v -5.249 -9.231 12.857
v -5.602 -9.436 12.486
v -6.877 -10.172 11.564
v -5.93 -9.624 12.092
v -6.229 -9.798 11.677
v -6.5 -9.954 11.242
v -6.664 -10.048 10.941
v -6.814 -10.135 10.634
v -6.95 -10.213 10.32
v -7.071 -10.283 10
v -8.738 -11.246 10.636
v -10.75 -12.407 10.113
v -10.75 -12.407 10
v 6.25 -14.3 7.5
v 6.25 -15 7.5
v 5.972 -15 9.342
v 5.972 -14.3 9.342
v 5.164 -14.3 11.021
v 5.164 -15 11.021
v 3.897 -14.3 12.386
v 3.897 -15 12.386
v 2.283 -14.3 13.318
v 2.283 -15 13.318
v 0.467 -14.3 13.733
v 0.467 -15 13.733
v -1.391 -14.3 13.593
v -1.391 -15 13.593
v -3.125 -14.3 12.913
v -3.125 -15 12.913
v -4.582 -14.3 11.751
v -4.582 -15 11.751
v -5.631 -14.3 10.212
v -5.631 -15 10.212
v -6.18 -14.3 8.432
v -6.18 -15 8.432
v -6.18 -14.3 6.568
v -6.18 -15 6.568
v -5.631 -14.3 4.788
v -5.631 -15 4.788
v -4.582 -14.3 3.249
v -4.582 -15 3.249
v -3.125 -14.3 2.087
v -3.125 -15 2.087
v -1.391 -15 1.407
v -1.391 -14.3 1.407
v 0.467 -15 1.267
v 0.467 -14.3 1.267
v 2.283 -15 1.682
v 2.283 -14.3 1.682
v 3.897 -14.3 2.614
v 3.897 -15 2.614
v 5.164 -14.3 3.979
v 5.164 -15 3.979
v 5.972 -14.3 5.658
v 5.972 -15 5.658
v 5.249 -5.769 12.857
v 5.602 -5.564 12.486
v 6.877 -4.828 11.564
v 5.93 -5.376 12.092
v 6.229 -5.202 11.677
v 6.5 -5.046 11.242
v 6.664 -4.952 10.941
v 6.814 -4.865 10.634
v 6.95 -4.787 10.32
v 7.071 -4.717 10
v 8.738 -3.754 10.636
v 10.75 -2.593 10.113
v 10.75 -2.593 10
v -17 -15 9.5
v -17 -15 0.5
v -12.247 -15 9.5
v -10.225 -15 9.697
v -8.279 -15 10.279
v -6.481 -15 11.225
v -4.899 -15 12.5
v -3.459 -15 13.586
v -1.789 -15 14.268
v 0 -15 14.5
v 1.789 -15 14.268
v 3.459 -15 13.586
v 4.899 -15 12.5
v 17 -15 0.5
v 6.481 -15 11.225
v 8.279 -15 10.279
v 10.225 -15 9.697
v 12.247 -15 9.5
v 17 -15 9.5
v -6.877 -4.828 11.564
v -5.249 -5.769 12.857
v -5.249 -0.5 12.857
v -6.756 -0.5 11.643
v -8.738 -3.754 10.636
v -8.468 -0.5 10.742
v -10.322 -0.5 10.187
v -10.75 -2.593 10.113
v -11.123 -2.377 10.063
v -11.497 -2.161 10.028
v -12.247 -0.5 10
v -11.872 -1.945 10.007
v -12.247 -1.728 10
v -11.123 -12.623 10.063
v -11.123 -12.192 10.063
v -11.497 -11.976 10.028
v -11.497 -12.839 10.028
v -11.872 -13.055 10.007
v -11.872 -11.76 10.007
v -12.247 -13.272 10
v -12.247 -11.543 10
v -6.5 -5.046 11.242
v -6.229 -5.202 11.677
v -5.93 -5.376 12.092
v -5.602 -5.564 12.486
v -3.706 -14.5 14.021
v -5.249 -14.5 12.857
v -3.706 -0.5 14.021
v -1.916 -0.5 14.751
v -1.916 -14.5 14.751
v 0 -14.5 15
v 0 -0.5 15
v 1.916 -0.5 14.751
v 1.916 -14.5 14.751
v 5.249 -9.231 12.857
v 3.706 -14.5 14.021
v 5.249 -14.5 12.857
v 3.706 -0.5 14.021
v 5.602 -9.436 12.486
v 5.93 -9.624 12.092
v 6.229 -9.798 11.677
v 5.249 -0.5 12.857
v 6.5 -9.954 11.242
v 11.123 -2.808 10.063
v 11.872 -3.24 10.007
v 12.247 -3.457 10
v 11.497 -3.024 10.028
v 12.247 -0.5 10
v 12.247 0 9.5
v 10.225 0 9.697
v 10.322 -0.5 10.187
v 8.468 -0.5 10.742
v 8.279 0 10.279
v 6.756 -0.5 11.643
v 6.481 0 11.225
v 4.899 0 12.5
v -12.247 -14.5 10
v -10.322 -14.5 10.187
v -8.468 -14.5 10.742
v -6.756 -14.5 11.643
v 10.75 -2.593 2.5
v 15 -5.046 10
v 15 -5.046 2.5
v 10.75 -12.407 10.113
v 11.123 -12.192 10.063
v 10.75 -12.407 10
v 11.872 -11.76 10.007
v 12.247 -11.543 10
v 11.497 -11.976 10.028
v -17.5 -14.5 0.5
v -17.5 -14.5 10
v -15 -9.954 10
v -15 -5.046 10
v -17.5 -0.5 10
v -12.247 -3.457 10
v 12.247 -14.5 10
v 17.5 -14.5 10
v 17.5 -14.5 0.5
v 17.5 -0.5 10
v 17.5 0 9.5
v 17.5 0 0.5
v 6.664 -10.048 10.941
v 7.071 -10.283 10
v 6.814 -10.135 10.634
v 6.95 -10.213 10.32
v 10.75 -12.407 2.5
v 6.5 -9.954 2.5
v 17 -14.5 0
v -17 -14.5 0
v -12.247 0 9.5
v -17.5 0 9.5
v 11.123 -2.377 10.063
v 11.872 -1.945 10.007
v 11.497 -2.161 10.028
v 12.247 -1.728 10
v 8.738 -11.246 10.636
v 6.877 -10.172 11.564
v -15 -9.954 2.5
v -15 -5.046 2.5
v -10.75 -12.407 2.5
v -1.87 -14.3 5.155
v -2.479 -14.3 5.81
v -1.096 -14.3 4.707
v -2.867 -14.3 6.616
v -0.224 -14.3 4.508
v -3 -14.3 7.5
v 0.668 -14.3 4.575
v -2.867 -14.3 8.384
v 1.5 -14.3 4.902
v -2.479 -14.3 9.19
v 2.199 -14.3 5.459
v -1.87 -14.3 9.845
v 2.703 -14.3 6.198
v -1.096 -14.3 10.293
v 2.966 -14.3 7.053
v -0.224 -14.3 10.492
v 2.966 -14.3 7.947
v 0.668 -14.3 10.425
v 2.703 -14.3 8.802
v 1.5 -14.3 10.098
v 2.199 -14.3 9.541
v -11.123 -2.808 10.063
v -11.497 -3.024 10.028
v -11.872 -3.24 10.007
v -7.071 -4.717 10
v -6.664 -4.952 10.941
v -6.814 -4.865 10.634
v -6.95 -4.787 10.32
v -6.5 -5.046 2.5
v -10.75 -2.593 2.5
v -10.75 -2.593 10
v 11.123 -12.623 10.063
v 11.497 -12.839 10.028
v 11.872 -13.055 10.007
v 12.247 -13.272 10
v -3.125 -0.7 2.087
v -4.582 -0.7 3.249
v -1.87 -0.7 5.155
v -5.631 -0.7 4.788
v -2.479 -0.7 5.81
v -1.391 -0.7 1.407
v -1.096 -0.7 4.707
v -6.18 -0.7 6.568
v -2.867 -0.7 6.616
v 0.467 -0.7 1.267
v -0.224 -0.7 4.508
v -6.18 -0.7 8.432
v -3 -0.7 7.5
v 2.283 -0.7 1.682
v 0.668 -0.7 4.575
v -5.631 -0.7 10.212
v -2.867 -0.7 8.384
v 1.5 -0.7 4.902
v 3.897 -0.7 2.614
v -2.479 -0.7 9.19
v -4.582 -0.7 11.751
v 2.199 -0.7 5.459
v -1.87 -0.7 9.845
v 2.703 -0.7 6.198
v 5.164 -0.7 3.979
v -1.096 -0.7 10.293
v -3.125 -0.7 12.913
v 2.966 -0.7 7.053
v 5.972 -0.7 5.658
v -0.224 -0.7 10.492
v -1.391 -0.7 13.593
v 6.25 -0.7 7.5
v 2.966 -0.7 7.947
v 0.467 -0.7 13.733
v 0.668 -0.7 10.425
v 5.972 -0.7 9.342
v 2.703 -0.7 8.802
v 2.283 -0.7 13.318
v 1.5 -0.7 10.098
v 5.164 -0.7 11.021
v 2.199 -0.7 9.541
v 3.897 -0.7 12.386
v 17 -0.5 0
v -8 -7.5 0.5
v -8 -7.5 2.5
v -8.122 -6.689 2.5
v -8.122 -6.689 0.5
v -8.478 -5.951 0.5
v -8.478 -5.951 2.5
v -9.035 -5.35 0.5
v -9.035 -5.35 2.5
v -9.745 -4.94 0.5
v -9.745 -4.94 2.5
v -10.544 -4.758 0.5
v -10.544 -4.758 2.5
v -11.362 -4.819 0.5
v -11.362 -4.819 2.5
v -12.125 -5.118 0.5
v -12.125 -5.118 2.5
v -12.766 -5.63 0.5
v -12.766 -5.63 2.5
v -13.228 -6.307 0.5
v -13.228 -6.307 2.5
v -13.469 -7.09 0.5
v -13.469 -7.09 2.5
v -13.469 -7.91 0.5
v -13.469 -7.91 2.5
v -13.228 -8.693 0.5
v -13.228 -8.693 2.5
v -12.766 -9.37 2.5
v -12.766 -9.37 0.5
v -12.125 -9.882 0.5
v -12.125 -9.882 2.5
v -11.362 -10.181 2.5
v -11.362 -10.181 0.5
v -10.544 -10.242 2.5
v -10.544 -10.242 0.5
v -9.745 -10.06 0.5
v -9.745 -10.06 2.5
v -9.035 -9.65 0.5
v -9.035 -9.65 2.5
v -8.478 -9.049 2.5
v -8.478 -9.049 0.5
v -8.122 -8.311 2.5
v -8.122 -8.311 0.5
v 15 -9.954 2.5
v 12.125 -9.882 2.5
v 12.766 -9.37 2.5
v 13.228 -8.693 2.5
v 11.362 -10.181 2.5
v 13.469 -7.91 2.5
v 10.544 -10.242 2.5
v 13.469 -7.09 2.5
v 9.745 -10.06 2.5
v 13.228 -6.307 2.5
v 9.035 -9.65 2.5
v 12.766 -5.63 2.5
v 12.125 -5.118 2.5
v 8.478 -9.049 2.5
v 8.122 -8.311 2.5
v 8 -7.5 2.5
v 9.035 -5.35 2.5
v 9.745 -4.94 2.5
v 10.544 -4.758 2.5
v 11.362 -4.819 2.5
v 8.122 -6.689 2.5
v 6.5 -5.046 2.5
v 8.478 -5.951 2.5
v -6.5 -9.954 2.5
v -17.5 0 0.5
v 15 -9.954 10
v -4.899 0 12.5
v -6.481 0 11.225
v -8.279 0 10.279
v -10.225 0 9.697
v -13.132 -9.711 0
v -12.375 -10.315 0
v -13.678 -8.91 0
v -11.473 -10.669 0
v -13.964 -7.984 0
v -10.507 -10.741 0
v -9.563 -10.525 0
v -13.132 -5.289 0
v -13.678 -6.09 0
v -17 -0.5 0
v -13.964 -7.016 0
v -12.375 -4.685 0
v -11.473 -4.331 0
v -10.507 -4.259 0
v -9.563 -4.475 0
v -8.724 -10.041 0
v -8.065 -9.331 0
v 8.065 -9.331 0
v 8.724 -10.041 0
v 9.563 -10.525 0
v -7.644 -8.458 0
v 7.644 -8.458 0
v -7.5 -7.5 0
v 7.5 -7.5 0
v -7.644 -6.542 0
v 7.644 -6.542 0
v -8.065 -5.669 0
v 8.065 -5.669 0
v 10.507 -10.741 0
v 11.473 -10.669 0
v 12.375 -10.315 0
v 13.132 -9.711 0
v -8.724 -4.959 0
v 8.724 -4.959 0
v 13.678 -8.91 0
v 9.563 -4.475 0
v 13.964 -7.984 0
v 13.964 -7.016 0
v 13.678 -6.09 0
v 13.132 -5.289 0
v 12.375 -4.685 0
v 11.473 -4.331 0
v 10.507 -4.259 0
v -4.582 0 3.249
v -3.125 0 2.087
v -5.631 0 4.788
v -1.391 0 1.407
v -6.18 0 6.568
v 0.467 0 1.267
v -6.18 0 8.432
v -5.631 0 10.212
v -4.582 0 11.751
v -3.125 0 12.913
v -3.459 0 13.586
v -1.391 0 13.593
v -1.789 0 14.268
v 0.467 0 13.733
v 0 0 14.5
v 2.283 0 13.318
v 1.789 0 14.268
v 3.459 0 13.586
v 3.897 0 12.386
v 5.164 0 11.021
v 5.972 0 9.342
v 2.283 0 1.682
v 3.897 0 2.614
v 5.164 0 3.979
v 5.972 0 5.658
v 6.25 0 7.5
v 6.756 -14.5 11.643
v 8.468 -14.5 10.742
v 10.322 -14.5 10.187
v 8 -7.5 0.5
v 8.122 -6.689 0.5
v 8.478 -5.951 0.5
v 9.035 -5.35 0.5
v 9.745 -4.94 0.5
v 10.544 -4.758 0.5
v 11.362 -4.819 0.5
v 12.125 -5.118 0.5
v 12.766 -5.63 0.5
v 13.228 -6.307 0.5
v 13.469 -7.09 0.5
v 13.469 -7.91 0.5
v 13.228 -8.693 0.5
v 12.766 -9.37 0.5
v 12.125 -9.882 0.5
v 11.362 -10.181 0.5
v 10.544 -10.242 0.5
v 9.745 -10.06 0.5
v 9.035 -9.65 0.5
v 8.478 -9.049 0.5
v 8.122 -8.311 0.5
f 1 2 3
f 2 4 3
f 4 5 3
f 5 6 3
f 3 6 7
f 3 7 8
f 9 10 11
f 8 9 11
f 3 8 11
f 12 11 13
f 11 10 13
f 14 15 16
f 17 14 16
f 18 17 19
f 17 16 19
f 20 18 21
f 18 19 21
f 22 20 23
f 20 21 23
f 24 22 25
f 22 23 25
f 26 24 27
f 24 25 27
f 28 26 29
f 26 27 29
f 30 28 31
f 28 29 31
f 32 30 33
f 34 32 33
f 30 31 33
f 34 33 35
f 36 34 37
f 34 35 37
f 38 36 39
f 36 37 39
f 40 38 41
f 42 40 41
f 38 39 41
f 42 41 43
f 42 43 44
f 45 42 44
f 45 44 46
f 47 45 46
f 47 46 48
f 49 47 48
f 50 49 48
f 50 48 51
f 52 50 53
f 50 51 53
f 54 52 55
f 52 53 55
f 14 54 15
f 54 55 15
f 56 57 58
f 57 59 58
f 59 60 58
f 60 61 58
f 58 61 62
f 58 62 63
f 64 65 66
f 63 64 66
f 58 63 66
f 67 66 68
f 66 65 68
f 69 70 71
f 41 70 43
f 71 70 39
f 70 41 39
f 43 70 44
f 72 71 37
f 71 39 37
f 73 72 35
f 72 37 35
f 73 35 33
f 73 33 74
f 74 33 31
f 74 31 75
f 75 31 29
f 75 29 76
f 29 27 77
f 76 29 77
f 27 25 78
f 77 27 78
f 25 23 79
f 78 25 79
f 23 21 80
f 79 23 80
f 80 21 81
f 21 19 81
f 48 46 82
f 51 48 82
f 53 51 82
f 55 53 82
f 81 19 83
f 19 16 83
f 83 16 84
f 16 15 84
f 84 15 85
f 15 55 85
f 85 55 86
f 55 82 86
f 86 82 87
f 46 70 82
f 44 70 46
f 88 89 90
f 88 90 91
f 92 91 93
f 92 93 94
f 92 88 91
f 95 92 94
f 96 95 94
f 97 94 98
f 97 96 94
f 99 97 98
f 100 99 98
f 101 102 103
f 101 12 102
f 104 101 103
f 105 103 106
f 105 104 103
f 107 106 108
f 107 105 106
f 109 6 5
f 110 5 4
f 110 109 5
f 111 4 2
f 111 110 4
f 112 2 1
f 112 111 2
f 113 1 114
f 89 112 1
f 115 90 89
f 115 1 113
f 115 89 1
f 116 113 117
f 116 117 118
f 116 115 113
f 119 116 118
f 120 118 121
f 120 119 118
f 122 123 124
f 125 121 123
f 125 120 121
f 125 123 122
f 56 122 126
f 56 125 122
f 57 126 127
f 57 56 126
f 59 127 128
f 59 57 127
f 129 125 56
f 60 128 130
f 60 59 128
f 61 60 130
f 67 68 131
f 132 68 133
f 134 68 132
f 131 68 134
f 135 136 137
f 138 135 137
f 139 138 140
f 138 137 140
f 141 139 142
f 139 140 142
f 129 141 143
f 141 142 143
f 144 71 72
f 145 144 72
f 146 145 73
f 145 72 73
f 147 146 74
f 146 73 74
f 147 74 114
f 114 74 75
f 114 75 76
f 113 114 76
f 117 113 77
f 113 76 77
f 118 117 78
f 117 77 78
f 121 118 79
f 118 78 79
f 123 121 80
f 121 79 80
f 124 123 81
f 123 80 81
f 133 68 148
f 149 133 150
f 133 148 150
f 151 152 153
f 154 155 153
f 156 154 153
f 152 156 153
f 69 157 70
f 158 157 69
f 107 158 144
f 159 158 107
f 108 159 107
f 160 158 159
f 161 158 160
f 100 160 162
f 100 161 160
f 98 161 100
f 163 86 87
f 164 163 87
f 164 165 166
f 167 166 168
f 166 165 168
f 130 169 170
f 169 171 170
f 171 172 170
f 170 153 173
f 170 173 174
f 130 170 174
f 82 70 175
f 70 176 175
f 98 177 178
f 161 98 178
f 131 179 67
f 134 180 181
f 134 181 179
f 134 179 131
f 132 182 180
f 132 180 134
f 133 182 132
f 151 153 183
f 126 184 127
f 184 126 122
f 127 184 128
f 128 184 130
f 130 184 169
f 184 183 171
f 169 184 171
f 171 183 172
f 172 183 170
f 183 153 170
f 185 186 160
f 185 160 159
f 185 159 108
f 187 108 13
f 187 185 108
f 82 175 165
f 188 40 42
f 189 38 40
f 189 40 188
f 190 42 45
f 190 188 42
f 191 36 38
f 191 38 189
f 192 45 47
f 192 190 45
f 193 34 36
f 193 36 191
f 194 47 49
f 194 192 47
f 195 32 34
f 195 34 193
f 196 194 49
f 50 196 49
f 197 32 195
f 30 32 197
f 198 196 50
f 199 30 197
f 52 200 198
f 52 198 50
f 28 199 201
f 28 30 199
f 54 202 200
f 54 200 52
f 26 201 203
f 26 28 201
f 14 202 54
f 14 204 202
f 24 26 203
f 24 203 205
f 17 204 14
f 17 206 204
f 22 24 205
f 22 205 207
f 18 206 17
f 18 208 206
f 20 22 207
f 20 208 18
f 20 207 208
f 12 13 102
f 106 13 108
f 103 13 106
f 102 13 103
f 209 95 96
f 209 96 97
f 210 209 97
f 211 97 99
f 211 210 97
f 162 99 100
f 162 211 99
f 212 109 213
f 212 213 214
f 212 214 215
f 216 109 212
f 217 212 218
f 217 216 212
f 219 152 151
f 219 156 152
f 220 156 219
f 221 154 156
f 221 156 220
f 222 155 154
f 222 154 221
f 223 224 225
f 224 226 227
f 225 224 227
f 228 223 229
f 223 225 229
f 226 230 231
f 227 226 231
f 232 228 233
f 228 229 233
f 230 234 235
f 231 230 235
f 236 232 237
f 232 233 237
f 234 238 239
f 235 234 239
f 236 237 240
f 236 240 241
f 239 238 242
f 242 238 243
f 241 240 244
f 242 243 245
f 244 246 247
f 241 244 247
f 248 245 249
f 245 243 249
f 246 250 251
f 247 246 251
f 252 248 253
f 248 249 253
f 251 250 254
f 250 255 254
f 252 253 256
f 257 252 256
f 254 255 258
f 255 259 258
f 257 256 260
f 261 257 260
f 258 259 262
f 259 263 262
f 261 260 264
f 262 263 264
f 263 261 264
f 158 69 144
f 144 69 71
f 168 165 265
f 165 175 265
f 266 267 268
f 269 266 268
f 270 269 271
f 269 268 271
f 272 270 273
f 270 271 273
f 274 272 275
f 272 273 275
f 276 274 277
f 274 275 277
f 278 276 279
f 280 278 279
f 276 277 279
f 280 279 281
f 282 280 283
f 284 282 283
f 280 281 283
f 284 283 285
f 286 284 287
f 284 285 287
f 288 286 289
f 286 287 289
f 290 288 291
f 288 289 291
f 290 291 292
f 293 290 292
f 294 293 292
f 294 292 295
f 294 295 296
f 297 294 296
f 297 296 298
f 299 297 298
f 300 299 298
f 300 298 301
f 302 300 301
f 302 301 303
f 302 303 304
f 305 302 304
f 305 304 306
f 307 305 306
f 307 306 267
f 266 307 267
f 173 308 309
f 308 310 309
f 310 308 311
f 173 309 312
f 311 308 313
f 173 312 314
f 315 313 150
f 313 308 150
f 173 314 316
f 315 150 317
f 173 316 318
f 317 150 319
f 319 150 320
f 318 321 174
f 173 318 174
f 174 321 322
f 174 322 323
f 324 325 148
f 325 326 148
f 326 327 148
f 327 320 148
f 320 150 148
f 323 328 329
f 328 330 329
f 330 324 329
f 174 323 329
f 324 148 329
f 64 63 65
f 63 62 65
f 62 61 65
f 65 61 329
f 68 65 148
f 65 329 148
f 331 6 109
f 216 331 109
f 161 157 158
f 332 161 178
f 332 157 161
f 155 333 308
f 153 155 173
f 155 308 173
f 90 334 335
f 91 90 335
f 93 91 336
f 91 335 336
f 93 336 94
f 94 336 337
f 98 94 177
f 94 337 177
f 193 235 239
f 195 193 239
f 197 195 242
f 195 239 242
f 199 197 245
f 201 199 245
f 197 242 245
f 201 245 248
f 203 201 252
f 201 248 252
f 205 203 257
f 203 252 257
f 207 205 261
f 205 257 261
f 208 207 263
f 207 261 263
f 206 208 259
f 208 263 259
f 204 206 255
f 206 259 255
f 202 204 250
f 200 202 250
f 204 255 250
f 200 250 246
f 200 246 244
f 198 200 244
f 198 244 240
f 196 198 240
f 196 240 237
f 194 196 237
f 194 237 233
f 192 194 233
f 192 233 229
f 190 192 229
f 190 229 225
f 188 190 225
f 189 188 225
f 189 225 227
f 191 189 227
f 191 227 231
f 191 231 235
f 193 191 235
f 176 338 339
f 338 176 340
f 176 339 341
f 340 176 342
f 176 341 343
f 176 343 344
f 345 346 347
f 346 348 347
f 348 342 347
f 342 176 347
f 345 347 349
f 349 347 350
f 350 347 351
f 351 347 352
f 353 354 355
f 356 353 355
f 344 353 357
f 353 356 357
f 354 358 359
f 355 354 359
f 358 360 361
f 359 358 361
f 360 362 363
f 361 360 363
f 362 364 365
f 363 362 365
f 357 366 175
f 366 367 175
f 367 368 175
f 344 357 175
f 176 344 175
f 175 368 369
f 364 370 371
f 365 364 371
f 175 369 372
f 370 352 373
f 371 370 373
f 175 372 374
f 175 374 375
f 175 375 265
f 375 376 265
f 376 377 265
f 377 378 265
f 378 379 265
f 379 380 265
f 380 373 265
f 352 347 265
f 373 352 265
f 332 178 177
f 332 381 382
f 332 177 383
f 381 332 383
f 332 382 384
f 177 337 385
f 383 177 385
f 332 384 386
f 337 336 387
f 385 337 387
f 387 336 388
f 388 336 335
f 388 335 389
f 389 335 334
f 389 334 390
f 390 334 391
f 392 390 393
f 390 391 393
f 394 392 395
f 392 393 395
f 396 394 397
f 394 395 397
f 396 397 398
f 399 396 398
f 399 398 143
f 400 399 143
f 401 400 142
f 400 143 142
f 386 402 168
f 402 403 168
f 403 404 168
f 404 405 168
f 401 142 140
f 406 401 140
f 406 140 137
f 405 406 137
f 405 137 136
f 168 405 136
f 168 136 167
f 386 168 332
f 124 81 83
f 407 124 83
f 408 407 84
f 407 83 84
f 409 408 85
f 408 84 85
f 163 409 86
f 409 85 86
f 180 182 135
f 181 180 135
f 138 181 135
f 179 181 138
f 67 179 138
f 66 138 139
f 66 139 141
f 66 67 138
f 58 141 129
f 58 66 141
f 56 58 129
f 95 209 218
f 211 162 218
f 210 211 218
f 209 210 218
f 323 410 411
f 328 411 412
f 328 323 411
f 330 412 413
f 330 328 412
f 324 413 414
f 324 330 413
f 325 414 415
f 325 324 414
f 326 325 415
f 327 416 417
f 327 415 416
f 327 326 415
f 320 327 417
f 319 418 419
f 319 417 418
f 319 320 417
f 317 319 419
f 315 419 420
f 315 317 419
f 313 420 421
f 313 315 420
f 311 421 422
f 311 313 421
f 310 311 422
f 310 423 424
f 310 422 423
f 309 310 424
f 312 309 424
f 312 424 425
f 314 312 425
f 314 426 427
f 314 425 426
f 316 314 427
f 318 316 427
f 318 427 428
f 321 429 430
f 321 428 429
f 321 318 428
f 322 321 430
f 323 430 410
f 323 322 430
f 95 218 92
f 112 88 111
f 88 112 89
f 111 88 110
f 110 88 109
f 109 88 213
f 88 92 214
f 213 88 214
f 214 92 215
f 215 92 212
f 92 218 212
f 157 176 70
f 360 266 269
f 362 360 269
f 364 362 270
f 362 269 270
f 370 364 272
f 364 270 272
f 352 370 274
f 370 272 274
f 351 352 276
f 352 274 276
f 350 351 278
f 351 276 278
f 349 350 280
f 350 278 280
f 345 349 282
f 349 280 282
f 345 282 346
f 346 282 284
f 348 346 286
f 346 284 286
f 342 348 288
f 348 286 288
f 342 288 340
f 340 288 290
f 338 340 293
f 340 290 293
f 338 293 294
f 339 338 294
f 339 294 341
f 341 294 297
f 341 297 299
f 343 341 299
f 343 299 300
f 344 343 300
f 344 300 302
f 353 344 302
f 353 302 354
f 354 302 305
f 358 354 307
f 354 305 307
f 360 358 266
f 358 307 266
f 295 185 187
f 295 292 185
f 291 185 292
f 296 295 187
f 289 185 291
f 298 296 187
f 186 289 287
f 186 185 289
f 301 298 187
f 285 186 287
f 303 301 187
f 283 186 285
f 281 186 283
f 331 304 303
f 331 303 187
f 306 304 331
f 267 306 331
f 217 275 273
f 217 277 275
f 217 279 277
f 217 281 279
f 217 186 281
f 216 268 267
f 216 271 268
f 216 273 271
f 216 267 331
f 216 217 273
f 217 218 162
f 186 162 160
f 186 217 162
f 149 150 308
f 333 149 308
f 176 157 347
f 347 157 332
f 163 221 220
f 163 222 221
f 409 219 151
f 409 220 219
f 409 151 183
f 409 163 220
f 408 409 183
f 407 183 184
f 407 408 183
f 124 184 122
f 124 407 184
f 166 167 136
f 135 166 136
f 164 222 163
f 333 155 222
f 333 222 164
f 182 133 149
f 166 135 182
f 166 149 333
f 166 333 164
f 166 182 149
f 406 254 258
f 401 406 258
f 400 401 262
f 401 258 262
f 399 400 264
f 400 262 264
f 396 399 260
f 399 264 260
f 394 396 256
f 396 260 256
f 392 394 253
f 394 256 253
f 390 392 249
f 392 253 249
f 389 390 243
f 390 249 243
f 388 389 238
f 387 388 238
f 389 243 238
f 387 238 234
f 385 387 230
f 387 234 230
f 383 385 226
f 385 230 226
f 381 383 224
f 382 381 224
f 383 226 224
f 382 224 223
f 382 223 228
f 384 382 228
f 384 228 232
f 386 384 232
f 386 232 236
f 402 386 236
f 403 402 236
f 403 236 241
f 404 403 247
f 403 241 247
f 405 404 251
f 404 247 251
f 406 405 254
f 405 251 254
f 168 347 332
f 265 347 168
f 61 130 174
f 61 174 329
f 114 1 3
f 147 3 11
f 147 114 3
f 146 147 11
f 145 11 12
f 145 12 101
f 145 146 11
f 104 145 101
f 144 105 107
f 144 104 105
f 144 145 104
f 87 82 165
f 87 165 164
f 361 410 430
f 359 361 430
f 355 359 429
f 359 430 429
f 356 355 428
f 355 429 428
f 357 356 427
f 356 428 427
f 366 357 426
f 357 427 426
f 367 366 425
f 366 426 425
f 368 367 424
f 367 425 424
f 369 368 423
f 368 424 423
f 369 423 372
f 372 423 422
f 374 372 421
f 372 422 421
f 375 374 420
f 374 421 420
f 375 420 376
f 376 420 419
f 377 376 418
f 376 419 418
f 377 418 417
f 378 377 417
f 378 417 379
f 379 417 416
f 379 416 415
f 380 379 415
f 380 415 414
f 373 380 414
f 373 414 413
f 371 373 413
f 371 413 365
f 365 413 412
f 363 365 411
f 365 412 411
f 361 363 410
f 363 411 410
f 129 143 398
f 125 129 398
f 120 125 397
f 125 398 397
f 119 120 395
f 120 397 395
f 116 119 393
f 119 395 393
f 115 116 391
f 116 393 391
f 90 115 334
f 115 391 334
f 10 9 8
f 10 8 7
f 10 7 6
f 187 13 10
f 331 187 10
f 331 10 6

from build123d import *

# Parameters (mm, degrees)
SKETCH1_W           = 35
SKETCH1_H           = 15
BOSS_EXTRUDE1_DEPTH = 10
SKETCH3_R           = 7.5
BOSS_EXTRUDE2_DEPTH = 15
CUT_EXTRUDE1_START  = -7.5
CUT_EXTRUDE1_DEPTH  = 17.5
SKETCH5_R           = 2.75
CUT_EXTRUDE3_DEPTH  = 27.220221204
SKETCH4_R           = 3
CUT_EXTRUDE2_DEPTH  = 28.5
FILLET1_R           = 10
SKETCH6_R           = 6.25
CUT_EXTRUDE4_DEPTH  = 0.7
CUT_EXTRUDE5_START  = -14.3
SKETCH6_3_R         = 6.25
CUT_EXTRUDE5_DEPTH  = 0.7
CHAMFER1_SIZE       = 0.5


with BuildPart() as part:
    # Sketch1 → Boss-Extrude1 (new body)
    with BuildSketch(Plane.XY):
        with Locations((0, -7.5)):
            Rectangle(SKETCH1_W, SKETCH1_H)
    extrude(amount=BOSS_EXTRUDE1_DEPTH)

    # Sketch3 → Boss-Extrude2 (add, through all)
    with BuildSketch(Plane(origin=(0, 0, 0), x_dir=(1, 0, 0), z_dir=(0, 1, 0))):
        with Locations((0, -7.5)):
            Circle(SKETCH3_R)
    extrude(amount=-BOSS_EXTRUDE2_DEPTH)

    # Sketch2 → Cut-Extrude1 (cut)
    with BuildSketch(Plane.XY.offset(10).offset(CUT_EXTRUDE1_START)):
        Polygon((-10.75, -12.407477288), (-6.5, -9.953738644), (-6.5, -5.046261356), (-10.75, -2.592522712), (-15, -5.046261356), (-15, -9.953738644), align=None)
    cut_extrude1 = extrude(amount=CUT_EXTRUDE1_DEPTH, mode=Mode.SUBTRACT)

    # Sketch5 → Cut-Extrude3 (cut, through all)
    with BuildSketch(Plane.XY.offset(2.5)):
        with Locations((-10.75, -7.5)):
            Circle(SKETCH5_R)
    cut_extrude3 = extrude(amount=-CUT_EXTRUDE3_DEPTH, mode=Mode.SUBTRACT)

    # Mirror1: Cut-Extrude1, Cut-Extrude3 across plane
    add(cut_extrude1.mirror(Plane(origin=(0, 0, 0), x_dir=(0, 0, 1), z_dir=(1, 0, 0))), mode=Mode.SUBTRACT)
    add(cut_extrude3.mirror(Plane(origin=(0, 0, 0), x_dir=(0, 0, 1), z_dir=(1, 0, 0))), mode=Mode.SUBTRACT)

    # Sketch4 → Cut-Extrude2 (cut, through all)
    with BuildSketch(Plane(origin=(0, 0, 0), x_dir=(1, 0, 0), z_dir=(0, 1, 0))):
        with Locations(Location((0, -7.5, 0), (0, 0, 180))):
            Circle(SKETCH4_R)
    extrude(amount=-CUT_EXTRUDE2_DEPTH, mode=Mode.SUBTRACT)

    # Fillet1
    # the kernel refuses this fillet: 10 mm, written as the material it adds along each edge
    with BuildSketch(Plane(origin=(7.071067812, -17.657507456, 10), x_dir=(-0.5377110557824625, 0, 0.8431291837490323), z_dir=(0, 1, 0))) as fillet1_piece_1_section:
        with BuildLine():
            CenterArc((5.647894598, 9.741468363), FILLET1_R, 212.527956019, 44.415308597)
            Line((-2.78339724, 4.364357805), (0, 0))
            ThreePointArc((0, 0), (1.694368379, 0.193898728), (3.388736759, 0))
        make_face()
    fillet1_piece_1 = extrude(amount=30.598459711, mode=Mode.PRIVATE)
    fillet1_piece_1 = split(fillet1_piece_1, bisect_by=Plane(origin=(6.425815385, -15, 11.617899052), z_dir=(0, 1, 0)), keep=Keep.TOP, mode=Mode.PRIVATE)
    fillet1_piece_1 = split(fillet1_piece_1, bisect_by=Plane(origin=(8.608682251, -11.17118691, 11.617899052), z_dir=(-0.49999999999999994, -0.8660254037844389, 0)), keep=Keep.TOP, mode=Mode.PRIVATE)
    add(fillet1_piece_1)
    with BuildSketch(Plane(origin=(7.071067812, -17.657507456, 10), x_dir=(-0.5377110557824625, 0, 0.8431291837490323), z_dir=(0, 1, 0))) as fillet1_piece_2_section:
        with BuildLine():
            CenterArc((5.647894598, 9.741468363), FILLET1_R, 212.527956019, 44.415308597)
            Line((-2.78339724, 4.364357805), (0, 0))
            ThreePointArc((0, 0), (1.694368379, 0.193898728), (3.388736759, 0))
        make_face()
    fillet1_piece_2 = extrude(amount=30.598459711, mode=Mode.PRIVATE)
    fillet1_piece_2 = split(fillet1_piece_2, bisect_by=Plane(origin=(11.198944739, -12.666675654, 10.022508618), z_dir=(0.49999999999999994, 0.8660254037844389, 0)), keep=Keep.TOP, mode=Mode.PRIVATE)
    fillet1_piece_2 = split(fillet1_piece_2, bisect_by=Plane(origin=(11.198944739, -12.148278922, 10.022508618), z_dir=(0.49999999999999994, -0.8660254037844389, 0)), keep=Keep.TOP, mode=Mode.PRIVATE)
    add(fillet1_piece_2)
    with BuildSketch(Plane(origin=(7.071067812, -17.657507456, 10), x_dir=(-0.5377110557824625, 0, 0.8431291837490323), z_dir=(0, 1, 0))) as fillet1_piece_3_section:
        with BuildLine():
            CenterArc((5.647894598, 9.741468363), FILLET1_R, 212.527956019, 44.415308597)
            Line((-2.78339724, 4.364357805), (0, 0))
            ThreePointArc((0, 0), (1.694368379, 0.193898728), (3.388736759, 0))
        make_face()
    fillet1_piece_3 = extrude(amount=17.657507456, mode=Mode.PRIVATE)
    fillet1_piece_3 = split(fillet1_piece_3, bisect_by=Plane(origin=(7.311033897, -4.578010717, 11.885204444), z_dir=(-0.5000000000000009, 0.8660254037844383, 0)), keep=Keep.TOP, mode=Mode.PRIVATE)
    add(fillet1_piece_3)
    with BuildSketch(Plane(origin=(7.071067812, -17.657507456, 10), x_dir=(-0.5377110557824625, 0, 0.8431291837490323), z_dir=(0, 1, 0))) as fillet1_piece_4_section:
        with BuildLine():
            CenterArc((5.647894598, 9.741468363), FILLET1_R, 212.527956019, 44.415308597)
            Line((-2.78339724, 4.364357805), (0, 0))
            ThreePointArc((0, 0), (1.694368379, 0.193898728), (3.388736759, 0))
        make_face()
    fillet1_piece_4 = extrude(amount=30.598459711, mode=Mode.PRIVATE)
    fillet1_piece_4 = split(fillet1_piece_4, bisect_by=Plane(origin=(11.198944739, -2.333324346, 10.022508618), z_dir=(0.5000000000000009, -0.8660254037844383, 0)), keep=Keep.TOP, mode=Mode.PRIVATE)
    fillet1_piece_4 = split(fillet1_piece_4, bisect_by=Plane(origin=(11.198944739, -2.851721078, 10.022508618), z_dir=(0.5000000000000001, 0.8660254037844386, 0)), keep=Keep.TOP, mode=Mode.PRIVATE)
    add(fillet1_piece_4)
    with BuildSketch(Plane(origin=(-7.071067812, -17.657507456, 10), x_dir=(-1, 0, 0), z_dir=(0, 1, 0))) as fillet1_piece_5_section:
        with BuildLine():
            CenterArc((5.176380902, 10), FILLET1_R, 225.584691403, 44.415308597)
            ThreePointArc((-1.82216122, 2.857142857), (-0.747598934, 1.532832918), (0, 0))
            Line((0, 0), (5.176380902, 0))
        make_face()
    fillet1_piece_5 = extrude(amount=30.598459711, mode=Mode.PRIVATE)
    fillet1_piece_5 = split(fillet1_piece_5, bisect_by=Plane(origin=(-8.687576495, -15, 10.380647158), z_dir=(0, 1, 0)), keep=Keep.TOP, mode=Mode.PRIVATE)
    fillet1_piece_5 = split(fillet1_piece_5, bisect_by=Plane(origin=(-10.026133402, -11.989552713, 10.380647158), z_dir=(0.49999999999999994, -0.8660254037844389, 0)), keep=Keep.TOP, mode=Mode.PRIVATE)
    add(fillet1_piece_5)
    with BuildSketch(Plane(origin=(-7.071067812, -17.657507456, 10), x_dir=(-1, 0, 0), z_dir=(0, 1, 0))) as fillet1_piece_6_section:
        with BuildLine():
            CenterArc((5.176380902, 10), FILLET1_R, 225.584691403, 44.415308597)
            ThreePointArc((-1.82216122, 2.857142857), (-0.747598934, 1.532832918), (0, 0))
            Line((0, 0), (5.176380902, 0))
        make_face()
    fillet1_piece_6 = extrude(amount=30.598459711, mode=Mode.PRIVATE)
    fillet1_piece_6 = split(fillet1_piece_6, bisect_by=Plane(origin=(-11.19894474, -12.666675654, 10.022508618), z_dir=(-0.49999999999999994, 0.8660254037844389, 0)), keep=Keep.TOP, mode=Mode.PRIVATE)
    fillet1_piece_6 = split(fillet1_piece_6, bisect_by=Plane(origin=(-11.19894474, -12.148278922, 10.022508618), z_dir=(-0.49999999999999994, -0.8660254037844389, 0)), keep=Keep.TOP, mode=Mode.PRIVATE)
    add(fillet1_piece_6)
    with BuildSketch(Plane(origin=(-7.071067812, -17.657507456, 10), x_dir=(-1, 0, 0), z_dir=(0, 1, 0))) as fillet1_piece_7_section:
        with BuildLine():
            CenterArc((5.176380902, 10), FILLET1_R, 225.584691403, 44.415308597)
            ThreePointArc((-1.82216122, 2.857142857), (-0.747598934, 1.532832918), (0, 0))
            Line((0, 0), (5.176380902, 0))
        make_face()
    fillet1_piece_7 = extrude(amount=17.657507456, mode=Mode.PRIVATE)
    fillet1_piece_7 = split(fillet1_piece_7, bisect_by=Plane(origin=(-8.42018253, -3.937643455, 10.662510622), z_dir=(0.5000000000000009, 0.8660254037844383, 0)), keep=Keep.TOP, mode=Mode.PRIVATE)
    add(fillet1_piece_7)
    with BuildSketch(Plane(origin=(-7.071067812, -17.657507456, 10), x_dir=(-1, 0, 0), z_dir=(0, 1, 0))) as fillet1_piece_8_section:
        with BuildLine():
            CenterArc((5.176380902, 10), FILLET1_R, 225.584691403, 44.415308597)
            ThreePointArc((-1.82216122, 2.857142857), (-0.747598934, 1.532832918), (0, 0))
            Line((0, 0), (5.176380902, 0))
        make_face()
    fillet1_piece_8 = extrude(amount=30.598459711, mode=Mode.PRIVATE)
    fillet1_piece_8 = split(fillet1_piece_8, bisect_by=Plane(origin=(-11.19894474, -2.851721078, 10.022508618), z_dir=(-0.5000000000000001, 0.8660254037844386, 0)), keep=Keep.TOP, mode=Mode.PRIVATE)
    fillet1_piece_8 = split(fillet1_piece_8, bisect_by=Plane(origin=(-11.19894474, -2.333324346, 10.022508618), z_dir=(-0.5000000000000009, -0.8660254037844383, 0)), keep=Keep.TOP, mode=Mode.PRIVATE)
    add(fillet1_piece_8)
    with BuildSketch(Plane(origin=(-7.071067812, -15, 10), x_dir=(-1, 0, 0), z_dir=(0, 1, 0))) as fillet1_piece_9_section:
        with BuildLine():
            CenterArc((5.176380902, 10), FILLET1_R, 225.584691403, 44.415308597)
            ThreePointArc((-1.82216122, 2.857142857), (-0.747598934, 1.532832918), (0, 0))
            Line((0, 0), (5.176380902, 0))
        make_face()
    fillet1_piece_9 = extrude(amount=17.657507456, mode=Mode.PRIVATE)
    fillet1_piece_9 = split(fillet1_piece_9, bisect_by=Plane(origin=(-10.026133402, -11.989552713, 10.380647158), z_dir=(0.49999999999999994, -0.8660254037844389, 0)), keep=Keep.TOP, mode=Mode.PRIVATE)
    add(fillet1_piece_9)
    with BuildSketch(Plane(origin=(-7.071067812, -27.940952255, 10), x_dir=(-1, 0, 0), z_dir=(0, 1, 0))) as fillet1_piece_10_section:
        with BuildLine():
            CenterArc((5.176380902, 10), FILLET1_R, 225.584691403, 44.415308597)
            ThreePointArc((-1.82216122, 2.857142857), (-0.747598934, 1.532832918), (0, 0))
            Line((0, 0), (5.176380902, 0))
        make_face()
    fillet1_piece_10 = extrude(amount=30.598459711, mode=Mode.PRIVATE)
    fillet1_piece_10 = split(fillet1_piece_10, bisect_by=Plane(origin=(-11.19894474, -12.666675654, 10.022508618), z_dir=(-0.49999999999999994, 0.8660254037844389, 0)), keep=Keep.TOP, mode=Mode.PRIVATE)
    fillet1_piece_10 = split(fillet1_piece_10, bisect_by=Plane(origin=(-11.19894474, -12.148278922, 10.022508618), z_dir=(-0.49999999999999994, -0.8660254037844389, 0)), keep=Keep.TOP, mode=Mode.PRIVATE)
    add(fillet1_piece_10)
    with BuildSketch(Plane(origin=(-7.071067812, -27.940952255, 10), x_dir=(-1, 0, 0), z_dir=(0, 1, 0))) as fillet1_piece_11_section:
        with BuildLine():
            CenterArc((5.176380902, 10), FILLET1_R, 225.584691403, 44.415308597)
            ThreePointArc((-1.82216122, 2.857142857), (-0.747598934, 1.532832918), (0, 0))
            Line((0, 0), (5.176380902, 0))
        make_face()
    fillet1_piece_11 = extrude(amount=30.598459711, mode=Mode.PRIVATE)
    fillet1_piece_11 = split(fillet1_piece_11, bisect_by=Plane(origin=(-7.643576707, 0, 10.662510622), z_dir=(0, -1, 0)), keep=Keep.TOP, mode=Mode.PRIVATE)
    fillet1_piece_11 = split(fillet1_piece_11, bisect_by=Plane(origin=(-8.42018253, -3.937643455, 10.662510622), z_dir=(0.5000000000000009, 0.8660254037844383, 0)), keep=Keep.TOP, mode=Mode.PRIVATE)
    add(fillet1_piece_11)
    with BuildSketch(Plane(origin=(-7.071067812, -27.940952255, 10), x_dir=(-1, 0, 0), z_dir=(0, 1, 0))) as fillet1_piece_12_section:
        with BuildLine():
            CenterArc((5.176380902, 10), FILLET1_R, 225.584691403, 44.415308597)
            ThreePointArc((-1.82216122, 2.857142857), (-0.747598934, 1.532832918), (0, 0))
            Line((0, 0), (5.176380902, 0))
        make_face()
    fillet1_piece_12 = extrude(amount=30.598459711, mode=Mode.PRIVATE)
    fillet1_piece_12 = split(fillet1_piece_12, bisect_by=Plane(origin=(-11.19894474, -2.851721078, 10.022508618), z_dir=(-0.5000000000000001, 0.8660254037844386, 0)), keep=Keep.TOP, mode=Mode.PRIVATE)
    fillet1_piece_12 = split(fillet1_piece_12, bisect_by=Plane(origin=(-11.19894474, -2.333324346, 10.022508618), z_dir=(-0.5000000000000009, -0.8660254037844383, 0)), keep=Keep.TOP, mode=Mode.PRIVATE)
    add(fillet1_piece_12)
    with BuildSketch(Plane(origin=(7.071067812, -15, 10), x_dir=(-0.537711055782462, 0, 0.8431291837490327), z_dir=(0, 1, 0))) as fillet1_piece_13_section:
        with BuildLine():
            CenterArc((5.647894598, 9.741468363), FILLET1_R, 212.527956019, 44.415308597)
            Line((-2.78339724, 4.364357805), (0, 0))
            ThreePointArc((0, 0), (1.694368379, 0.193898728), (3.388736759, 0))
        make_face()
    fillet1_piece_13 = extrude(amount=17.657507456, mode=Mode.PRIVATE)
    fillet1_piece_13 = split(fillet1_piece_13, bisect_by=Plane(origin=(8.608682251, -11.17118691, 11.617899052), z_dir=(-0.49999999999999994, -0.8660254037844389, 0)), keep=Keep.TOP, mode=Mode.PRIVATE)
    add(fillet1_piece_13)
    with BuildSketch(Plane(origin=(7.071067812, -27.940952255, 10), x_dir=(-0.5377110557824618, 0, 0.8431291837490328), z_dir=(0, 1, 0))) as fillet1_piece_14_section:
        with BuildLine():
            CenterArc((5.647894598, 9.741468363), FILLET1_R, 212.527956019, 44.415308597)
            Line((-2.78339724, 4.364357805), (0, 0))
            ThreePointArc((0, 0), (1.694368379, 0.193898728), (3.388736759, 0))
        make_face()
    fillet1_piece_14 = extrude(amount=30.598459711, mode=Mode.PRIVATE)
    fillet1_piece_14 = split(fillet1_piece_14, bisect_by=Plane(origin=(11.198944739, -12.666675654, 10.022508618), z_dir=(0.49999999999999994, 0.8660254037844389, 0)), keep=Keep.TOP, mode=Mode.PRIVATE)
    fillet1_piece_14 = split(fillet1_piece_14, bisect_by=Plane(origin=(11.198944739, -12.148278922, 10.022508618), z_dir=(0.49999999999999994, -0.8660254037844389, 0)), keep=Keep.TOP, mode=Mode.PRIVATE)
    add(fillet1_piece_14)
    with BuildSketch(Plane(origin=(7.071067812, -27.940952255, 10), x_dir=(-0.5377110557824618, 0, 0.8431291837490328), z_dir=(0, 1, 0))) as fillet1_piece_15_section:
        with BuildLine():
            CenterArc((5.647894598, 9.741468363), FILLET1_R, 212.527956019, 44.415308597)
            Line((-2.78339724, 4.364357805), (0, 0))
            ThreePointArc((0, 0), (1.694368379, 0.193898728), (3.388736759, 0))
        make_face()
    fillet1_piece_15 = extrude(amount=30.598459711, mode=Mode.PRIVATE)
    fillet1_piece_15 = split(fillet1_piece_15, bisect_by=Plane(origin=(6.186931612, 0, 11.885204444), z_dir=(0, -1, 0)), keep=Keep.TOP, mode=Mode.PRIVATE)
    fillet1_piece_15 = split(fillet1_piece_15, bisect_by=Plane(origin=(7.311033897, -4.578010717, 11.885204444), z_dir=(-0.5000000000000009, 0.8660254037844383, 0)), keep=Keep.TOP, mode=Mode.PRIVATE)
    add(fillet1_piece_15)
    with BuildSketch(Plane(origin=(7.071067812, -27.940952255, 10), x_dir=(-0.5377110557824618, 0, 0.8431291837490328), z_dir=(0, 1, 0))) as fillet1_piece_16_section:
        with BuildLine():
            CenterArc((5.647894598, 9.741468363), FILLET1_R, 212.527956019, 44.415308597)
            Line((-2.78339724, 4.364357805), (0, 0))
            ThreePointArc((0, 0), (1.694368379, 0.193898728), (3.388736759, 0))
        make_face()
    fillet1_piece_16 = extrude(amount=30.598459711, mode=Mode.PRIVATE)
    fillet1_piece_16 = split(fillet1_piece_16, bisect_by=Plane(origin=(11.198944739, -2.333324346, 10.022508618), z_dir=(0.5000000000000009, -0.8660254037844383, 0)), keep=Keep.TOP, mode=Mode.PRIVATE)
    fillet1_piece_16 = split(fillet1_piece_16, bisect_by=Plane(origin=(11.198944739, -2.851721078, 10.022508618), z_dir=(0.5000000000000001, 0.8660254037844386, 0)), keep=Keep.TOP, mode=Mode.PRIVATE)
    add(fillet1_piece_16)

    # Sketch6 → Cut-Extrude4 (cut)
    with BuildSketch(Plane.XZ.offset(15)):
        with Locations((0, 7.5)):
            Circle(SKETCH6_R)
    extrude(amount=-CUT_EXTRUDE4_DEPTH, mode=Mode.SUBTRACT)

    # Sketch6<3> → Cut-Extrude5 (cut)
    with BuildSketch(Plane.XZ.offset(15).offset(CUT_EXTRUDE5_START)):
        with Locations((0, 7.5)):
            Circle(SKETCH6_3_R)
    extrude(amount=-CUT_EXTRUDE5_DEPTH, mode=Mode.SUBTRACT)

    # Chamfer1
    chamfer1_edges = [part.edges().sort_by_distance(p)[0] for p in [
        (8.467803984, 0, 10.741799002),
        (8.467803984, -15, 10.741799002),
        (-8.467803984, -15, 10.741799002),
        (-8.467803984, 0, 10.741799002),
        (14.873724357, 0, 10),
        (0, 0, 0),
        (17.5, -7.5, 0),
        (0, -15, 0),
        (-13.5, -7.5, 0),
        (-17.5, -7.5, 0),
        (-14.873724357, -15, 10),
        (17.5, -15, 5),
        (-17.5, -15, 5),
        (13.5, -7.5, 0),
        (0, 0, 15),
        (0, -15, 15),
        (14.873724357, -15, 10),
        (-14.873724357, 0, 10),
    ]]
    chamfer(chamfer1_edges, length=CHAMFER1_SIZE)


solid = part.part
